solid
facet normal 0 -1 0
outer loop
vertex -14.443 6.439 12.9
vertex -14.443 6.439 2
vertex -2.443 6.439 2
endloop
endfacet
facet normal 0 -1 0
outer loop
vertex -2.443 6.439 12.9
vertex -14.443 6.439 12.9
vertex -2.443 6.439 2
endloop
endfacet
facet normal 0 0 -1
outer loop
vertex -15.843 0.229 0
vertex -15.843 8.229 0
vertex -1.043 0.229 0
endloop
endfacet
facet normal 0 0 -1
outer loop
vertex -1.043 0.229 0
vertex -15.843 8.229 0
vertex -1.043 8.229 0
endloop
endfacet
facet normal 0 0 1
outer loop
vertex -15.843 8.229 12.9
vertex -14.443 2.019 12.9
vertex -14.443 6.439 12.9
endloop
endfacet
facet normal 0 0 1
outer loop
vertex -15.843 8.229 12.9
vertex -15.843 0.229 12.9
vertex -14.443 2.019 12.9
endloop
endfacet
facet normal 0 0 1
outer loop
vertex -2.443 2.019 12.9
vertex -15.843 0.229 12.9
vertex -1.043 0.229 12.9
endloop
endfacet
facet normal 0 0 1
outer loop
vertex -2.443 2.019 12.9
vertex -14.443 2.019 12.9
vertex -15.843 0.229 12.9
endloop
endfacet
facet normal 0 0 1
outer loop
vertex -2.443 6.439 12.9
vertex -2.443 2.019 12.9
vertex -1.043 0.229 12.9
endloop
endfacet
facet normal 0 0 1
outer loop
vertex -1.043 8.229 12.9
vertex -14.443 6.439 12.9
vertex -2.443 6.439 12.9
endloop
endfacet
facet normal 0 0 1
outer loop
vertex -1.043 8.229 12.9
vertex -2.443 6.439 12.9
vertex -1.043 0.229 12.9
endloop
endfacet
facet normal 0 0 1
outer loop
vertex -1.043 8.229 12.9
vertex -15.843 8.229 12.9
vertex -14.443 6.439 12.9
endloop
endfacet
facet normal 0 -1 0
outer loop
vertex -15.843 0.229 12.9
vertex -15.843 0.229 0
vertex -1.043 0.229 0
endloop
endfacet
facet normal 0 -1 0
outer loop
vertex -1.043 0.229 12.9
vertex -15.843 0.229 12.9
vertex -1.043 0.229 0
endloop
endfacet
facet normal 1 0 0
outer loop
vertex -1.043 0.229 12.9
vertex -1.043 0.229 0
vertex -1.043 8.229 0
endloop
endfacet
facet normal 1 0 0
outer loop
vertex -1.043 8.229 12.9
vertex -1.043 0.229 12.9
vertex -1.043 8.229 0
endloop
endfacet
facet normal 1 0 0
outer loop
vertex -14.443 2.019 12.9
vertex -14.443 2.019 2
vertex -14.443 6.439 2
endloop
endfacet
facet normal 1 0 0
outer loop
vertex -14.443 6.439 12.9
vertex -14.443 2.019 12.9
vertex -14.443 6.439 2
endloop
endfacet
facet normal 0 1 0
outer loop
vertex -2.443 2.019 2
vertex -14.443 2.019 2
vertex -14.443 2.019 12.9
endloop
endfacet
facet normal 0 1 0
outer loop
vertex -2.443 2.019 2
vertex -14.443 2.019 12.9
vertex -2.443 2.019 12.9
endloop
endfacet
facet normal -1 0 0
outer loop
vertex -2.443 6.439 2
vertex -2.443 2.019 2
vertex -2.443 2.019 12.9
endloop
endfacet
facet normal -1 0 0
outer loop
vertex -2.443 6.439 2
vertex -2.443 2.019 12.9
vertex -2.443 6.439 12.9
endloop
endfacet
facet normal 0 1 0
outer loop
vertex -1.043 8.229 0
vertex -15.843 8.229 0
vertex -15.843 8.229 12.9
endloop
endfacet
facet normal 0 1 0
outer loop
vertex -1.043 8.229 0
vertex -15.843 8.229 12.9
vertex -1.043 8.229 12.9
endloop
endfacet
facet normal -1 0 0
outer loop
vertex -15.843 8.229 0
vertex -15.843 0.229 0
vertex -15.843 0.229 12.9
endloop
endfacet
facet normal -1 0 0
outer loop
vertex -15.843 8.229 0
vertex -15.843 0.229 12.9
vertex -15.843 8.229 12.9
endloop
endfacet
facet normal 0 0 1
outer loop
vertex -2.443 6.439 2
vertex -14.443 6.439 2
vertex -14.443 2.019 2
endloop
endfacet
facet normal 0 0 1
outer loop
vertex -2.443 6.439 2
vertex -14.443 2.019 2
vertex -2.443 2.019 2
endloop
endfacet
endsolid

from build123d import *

# Parameters (mm, degrees)
F0_W     = 12
F0_H     = 4.42
F1_DEPTH = 2
F0_W_2   = 14.8
F0_H_2   = 8
F2_DEPTH = 12.9


with BuildPart() as f1:
    # F0 (on Top) → F1 (new body)
    with BuildSketch(Plane.XY):
        with Locations((-8.442831, 4.229229)):
            Rectangle(F0_W, F0_H)
    extrude(amount=F1_DEPTH)

    # F0 (on Top) → F2 (join)
    with BuildSketch(Plane.XY):
        with Locations((-8.442831, 4.229229)):
            Rectangle(F0_W_2, F0_H_2)
        with Locations((-8.442831, 4.229229)):
            Rectangle(F0_W, F0_H, mode=Mode.SUBTRACT)
    extrude(amount=F2_DEPTH)


solid = f1.part
